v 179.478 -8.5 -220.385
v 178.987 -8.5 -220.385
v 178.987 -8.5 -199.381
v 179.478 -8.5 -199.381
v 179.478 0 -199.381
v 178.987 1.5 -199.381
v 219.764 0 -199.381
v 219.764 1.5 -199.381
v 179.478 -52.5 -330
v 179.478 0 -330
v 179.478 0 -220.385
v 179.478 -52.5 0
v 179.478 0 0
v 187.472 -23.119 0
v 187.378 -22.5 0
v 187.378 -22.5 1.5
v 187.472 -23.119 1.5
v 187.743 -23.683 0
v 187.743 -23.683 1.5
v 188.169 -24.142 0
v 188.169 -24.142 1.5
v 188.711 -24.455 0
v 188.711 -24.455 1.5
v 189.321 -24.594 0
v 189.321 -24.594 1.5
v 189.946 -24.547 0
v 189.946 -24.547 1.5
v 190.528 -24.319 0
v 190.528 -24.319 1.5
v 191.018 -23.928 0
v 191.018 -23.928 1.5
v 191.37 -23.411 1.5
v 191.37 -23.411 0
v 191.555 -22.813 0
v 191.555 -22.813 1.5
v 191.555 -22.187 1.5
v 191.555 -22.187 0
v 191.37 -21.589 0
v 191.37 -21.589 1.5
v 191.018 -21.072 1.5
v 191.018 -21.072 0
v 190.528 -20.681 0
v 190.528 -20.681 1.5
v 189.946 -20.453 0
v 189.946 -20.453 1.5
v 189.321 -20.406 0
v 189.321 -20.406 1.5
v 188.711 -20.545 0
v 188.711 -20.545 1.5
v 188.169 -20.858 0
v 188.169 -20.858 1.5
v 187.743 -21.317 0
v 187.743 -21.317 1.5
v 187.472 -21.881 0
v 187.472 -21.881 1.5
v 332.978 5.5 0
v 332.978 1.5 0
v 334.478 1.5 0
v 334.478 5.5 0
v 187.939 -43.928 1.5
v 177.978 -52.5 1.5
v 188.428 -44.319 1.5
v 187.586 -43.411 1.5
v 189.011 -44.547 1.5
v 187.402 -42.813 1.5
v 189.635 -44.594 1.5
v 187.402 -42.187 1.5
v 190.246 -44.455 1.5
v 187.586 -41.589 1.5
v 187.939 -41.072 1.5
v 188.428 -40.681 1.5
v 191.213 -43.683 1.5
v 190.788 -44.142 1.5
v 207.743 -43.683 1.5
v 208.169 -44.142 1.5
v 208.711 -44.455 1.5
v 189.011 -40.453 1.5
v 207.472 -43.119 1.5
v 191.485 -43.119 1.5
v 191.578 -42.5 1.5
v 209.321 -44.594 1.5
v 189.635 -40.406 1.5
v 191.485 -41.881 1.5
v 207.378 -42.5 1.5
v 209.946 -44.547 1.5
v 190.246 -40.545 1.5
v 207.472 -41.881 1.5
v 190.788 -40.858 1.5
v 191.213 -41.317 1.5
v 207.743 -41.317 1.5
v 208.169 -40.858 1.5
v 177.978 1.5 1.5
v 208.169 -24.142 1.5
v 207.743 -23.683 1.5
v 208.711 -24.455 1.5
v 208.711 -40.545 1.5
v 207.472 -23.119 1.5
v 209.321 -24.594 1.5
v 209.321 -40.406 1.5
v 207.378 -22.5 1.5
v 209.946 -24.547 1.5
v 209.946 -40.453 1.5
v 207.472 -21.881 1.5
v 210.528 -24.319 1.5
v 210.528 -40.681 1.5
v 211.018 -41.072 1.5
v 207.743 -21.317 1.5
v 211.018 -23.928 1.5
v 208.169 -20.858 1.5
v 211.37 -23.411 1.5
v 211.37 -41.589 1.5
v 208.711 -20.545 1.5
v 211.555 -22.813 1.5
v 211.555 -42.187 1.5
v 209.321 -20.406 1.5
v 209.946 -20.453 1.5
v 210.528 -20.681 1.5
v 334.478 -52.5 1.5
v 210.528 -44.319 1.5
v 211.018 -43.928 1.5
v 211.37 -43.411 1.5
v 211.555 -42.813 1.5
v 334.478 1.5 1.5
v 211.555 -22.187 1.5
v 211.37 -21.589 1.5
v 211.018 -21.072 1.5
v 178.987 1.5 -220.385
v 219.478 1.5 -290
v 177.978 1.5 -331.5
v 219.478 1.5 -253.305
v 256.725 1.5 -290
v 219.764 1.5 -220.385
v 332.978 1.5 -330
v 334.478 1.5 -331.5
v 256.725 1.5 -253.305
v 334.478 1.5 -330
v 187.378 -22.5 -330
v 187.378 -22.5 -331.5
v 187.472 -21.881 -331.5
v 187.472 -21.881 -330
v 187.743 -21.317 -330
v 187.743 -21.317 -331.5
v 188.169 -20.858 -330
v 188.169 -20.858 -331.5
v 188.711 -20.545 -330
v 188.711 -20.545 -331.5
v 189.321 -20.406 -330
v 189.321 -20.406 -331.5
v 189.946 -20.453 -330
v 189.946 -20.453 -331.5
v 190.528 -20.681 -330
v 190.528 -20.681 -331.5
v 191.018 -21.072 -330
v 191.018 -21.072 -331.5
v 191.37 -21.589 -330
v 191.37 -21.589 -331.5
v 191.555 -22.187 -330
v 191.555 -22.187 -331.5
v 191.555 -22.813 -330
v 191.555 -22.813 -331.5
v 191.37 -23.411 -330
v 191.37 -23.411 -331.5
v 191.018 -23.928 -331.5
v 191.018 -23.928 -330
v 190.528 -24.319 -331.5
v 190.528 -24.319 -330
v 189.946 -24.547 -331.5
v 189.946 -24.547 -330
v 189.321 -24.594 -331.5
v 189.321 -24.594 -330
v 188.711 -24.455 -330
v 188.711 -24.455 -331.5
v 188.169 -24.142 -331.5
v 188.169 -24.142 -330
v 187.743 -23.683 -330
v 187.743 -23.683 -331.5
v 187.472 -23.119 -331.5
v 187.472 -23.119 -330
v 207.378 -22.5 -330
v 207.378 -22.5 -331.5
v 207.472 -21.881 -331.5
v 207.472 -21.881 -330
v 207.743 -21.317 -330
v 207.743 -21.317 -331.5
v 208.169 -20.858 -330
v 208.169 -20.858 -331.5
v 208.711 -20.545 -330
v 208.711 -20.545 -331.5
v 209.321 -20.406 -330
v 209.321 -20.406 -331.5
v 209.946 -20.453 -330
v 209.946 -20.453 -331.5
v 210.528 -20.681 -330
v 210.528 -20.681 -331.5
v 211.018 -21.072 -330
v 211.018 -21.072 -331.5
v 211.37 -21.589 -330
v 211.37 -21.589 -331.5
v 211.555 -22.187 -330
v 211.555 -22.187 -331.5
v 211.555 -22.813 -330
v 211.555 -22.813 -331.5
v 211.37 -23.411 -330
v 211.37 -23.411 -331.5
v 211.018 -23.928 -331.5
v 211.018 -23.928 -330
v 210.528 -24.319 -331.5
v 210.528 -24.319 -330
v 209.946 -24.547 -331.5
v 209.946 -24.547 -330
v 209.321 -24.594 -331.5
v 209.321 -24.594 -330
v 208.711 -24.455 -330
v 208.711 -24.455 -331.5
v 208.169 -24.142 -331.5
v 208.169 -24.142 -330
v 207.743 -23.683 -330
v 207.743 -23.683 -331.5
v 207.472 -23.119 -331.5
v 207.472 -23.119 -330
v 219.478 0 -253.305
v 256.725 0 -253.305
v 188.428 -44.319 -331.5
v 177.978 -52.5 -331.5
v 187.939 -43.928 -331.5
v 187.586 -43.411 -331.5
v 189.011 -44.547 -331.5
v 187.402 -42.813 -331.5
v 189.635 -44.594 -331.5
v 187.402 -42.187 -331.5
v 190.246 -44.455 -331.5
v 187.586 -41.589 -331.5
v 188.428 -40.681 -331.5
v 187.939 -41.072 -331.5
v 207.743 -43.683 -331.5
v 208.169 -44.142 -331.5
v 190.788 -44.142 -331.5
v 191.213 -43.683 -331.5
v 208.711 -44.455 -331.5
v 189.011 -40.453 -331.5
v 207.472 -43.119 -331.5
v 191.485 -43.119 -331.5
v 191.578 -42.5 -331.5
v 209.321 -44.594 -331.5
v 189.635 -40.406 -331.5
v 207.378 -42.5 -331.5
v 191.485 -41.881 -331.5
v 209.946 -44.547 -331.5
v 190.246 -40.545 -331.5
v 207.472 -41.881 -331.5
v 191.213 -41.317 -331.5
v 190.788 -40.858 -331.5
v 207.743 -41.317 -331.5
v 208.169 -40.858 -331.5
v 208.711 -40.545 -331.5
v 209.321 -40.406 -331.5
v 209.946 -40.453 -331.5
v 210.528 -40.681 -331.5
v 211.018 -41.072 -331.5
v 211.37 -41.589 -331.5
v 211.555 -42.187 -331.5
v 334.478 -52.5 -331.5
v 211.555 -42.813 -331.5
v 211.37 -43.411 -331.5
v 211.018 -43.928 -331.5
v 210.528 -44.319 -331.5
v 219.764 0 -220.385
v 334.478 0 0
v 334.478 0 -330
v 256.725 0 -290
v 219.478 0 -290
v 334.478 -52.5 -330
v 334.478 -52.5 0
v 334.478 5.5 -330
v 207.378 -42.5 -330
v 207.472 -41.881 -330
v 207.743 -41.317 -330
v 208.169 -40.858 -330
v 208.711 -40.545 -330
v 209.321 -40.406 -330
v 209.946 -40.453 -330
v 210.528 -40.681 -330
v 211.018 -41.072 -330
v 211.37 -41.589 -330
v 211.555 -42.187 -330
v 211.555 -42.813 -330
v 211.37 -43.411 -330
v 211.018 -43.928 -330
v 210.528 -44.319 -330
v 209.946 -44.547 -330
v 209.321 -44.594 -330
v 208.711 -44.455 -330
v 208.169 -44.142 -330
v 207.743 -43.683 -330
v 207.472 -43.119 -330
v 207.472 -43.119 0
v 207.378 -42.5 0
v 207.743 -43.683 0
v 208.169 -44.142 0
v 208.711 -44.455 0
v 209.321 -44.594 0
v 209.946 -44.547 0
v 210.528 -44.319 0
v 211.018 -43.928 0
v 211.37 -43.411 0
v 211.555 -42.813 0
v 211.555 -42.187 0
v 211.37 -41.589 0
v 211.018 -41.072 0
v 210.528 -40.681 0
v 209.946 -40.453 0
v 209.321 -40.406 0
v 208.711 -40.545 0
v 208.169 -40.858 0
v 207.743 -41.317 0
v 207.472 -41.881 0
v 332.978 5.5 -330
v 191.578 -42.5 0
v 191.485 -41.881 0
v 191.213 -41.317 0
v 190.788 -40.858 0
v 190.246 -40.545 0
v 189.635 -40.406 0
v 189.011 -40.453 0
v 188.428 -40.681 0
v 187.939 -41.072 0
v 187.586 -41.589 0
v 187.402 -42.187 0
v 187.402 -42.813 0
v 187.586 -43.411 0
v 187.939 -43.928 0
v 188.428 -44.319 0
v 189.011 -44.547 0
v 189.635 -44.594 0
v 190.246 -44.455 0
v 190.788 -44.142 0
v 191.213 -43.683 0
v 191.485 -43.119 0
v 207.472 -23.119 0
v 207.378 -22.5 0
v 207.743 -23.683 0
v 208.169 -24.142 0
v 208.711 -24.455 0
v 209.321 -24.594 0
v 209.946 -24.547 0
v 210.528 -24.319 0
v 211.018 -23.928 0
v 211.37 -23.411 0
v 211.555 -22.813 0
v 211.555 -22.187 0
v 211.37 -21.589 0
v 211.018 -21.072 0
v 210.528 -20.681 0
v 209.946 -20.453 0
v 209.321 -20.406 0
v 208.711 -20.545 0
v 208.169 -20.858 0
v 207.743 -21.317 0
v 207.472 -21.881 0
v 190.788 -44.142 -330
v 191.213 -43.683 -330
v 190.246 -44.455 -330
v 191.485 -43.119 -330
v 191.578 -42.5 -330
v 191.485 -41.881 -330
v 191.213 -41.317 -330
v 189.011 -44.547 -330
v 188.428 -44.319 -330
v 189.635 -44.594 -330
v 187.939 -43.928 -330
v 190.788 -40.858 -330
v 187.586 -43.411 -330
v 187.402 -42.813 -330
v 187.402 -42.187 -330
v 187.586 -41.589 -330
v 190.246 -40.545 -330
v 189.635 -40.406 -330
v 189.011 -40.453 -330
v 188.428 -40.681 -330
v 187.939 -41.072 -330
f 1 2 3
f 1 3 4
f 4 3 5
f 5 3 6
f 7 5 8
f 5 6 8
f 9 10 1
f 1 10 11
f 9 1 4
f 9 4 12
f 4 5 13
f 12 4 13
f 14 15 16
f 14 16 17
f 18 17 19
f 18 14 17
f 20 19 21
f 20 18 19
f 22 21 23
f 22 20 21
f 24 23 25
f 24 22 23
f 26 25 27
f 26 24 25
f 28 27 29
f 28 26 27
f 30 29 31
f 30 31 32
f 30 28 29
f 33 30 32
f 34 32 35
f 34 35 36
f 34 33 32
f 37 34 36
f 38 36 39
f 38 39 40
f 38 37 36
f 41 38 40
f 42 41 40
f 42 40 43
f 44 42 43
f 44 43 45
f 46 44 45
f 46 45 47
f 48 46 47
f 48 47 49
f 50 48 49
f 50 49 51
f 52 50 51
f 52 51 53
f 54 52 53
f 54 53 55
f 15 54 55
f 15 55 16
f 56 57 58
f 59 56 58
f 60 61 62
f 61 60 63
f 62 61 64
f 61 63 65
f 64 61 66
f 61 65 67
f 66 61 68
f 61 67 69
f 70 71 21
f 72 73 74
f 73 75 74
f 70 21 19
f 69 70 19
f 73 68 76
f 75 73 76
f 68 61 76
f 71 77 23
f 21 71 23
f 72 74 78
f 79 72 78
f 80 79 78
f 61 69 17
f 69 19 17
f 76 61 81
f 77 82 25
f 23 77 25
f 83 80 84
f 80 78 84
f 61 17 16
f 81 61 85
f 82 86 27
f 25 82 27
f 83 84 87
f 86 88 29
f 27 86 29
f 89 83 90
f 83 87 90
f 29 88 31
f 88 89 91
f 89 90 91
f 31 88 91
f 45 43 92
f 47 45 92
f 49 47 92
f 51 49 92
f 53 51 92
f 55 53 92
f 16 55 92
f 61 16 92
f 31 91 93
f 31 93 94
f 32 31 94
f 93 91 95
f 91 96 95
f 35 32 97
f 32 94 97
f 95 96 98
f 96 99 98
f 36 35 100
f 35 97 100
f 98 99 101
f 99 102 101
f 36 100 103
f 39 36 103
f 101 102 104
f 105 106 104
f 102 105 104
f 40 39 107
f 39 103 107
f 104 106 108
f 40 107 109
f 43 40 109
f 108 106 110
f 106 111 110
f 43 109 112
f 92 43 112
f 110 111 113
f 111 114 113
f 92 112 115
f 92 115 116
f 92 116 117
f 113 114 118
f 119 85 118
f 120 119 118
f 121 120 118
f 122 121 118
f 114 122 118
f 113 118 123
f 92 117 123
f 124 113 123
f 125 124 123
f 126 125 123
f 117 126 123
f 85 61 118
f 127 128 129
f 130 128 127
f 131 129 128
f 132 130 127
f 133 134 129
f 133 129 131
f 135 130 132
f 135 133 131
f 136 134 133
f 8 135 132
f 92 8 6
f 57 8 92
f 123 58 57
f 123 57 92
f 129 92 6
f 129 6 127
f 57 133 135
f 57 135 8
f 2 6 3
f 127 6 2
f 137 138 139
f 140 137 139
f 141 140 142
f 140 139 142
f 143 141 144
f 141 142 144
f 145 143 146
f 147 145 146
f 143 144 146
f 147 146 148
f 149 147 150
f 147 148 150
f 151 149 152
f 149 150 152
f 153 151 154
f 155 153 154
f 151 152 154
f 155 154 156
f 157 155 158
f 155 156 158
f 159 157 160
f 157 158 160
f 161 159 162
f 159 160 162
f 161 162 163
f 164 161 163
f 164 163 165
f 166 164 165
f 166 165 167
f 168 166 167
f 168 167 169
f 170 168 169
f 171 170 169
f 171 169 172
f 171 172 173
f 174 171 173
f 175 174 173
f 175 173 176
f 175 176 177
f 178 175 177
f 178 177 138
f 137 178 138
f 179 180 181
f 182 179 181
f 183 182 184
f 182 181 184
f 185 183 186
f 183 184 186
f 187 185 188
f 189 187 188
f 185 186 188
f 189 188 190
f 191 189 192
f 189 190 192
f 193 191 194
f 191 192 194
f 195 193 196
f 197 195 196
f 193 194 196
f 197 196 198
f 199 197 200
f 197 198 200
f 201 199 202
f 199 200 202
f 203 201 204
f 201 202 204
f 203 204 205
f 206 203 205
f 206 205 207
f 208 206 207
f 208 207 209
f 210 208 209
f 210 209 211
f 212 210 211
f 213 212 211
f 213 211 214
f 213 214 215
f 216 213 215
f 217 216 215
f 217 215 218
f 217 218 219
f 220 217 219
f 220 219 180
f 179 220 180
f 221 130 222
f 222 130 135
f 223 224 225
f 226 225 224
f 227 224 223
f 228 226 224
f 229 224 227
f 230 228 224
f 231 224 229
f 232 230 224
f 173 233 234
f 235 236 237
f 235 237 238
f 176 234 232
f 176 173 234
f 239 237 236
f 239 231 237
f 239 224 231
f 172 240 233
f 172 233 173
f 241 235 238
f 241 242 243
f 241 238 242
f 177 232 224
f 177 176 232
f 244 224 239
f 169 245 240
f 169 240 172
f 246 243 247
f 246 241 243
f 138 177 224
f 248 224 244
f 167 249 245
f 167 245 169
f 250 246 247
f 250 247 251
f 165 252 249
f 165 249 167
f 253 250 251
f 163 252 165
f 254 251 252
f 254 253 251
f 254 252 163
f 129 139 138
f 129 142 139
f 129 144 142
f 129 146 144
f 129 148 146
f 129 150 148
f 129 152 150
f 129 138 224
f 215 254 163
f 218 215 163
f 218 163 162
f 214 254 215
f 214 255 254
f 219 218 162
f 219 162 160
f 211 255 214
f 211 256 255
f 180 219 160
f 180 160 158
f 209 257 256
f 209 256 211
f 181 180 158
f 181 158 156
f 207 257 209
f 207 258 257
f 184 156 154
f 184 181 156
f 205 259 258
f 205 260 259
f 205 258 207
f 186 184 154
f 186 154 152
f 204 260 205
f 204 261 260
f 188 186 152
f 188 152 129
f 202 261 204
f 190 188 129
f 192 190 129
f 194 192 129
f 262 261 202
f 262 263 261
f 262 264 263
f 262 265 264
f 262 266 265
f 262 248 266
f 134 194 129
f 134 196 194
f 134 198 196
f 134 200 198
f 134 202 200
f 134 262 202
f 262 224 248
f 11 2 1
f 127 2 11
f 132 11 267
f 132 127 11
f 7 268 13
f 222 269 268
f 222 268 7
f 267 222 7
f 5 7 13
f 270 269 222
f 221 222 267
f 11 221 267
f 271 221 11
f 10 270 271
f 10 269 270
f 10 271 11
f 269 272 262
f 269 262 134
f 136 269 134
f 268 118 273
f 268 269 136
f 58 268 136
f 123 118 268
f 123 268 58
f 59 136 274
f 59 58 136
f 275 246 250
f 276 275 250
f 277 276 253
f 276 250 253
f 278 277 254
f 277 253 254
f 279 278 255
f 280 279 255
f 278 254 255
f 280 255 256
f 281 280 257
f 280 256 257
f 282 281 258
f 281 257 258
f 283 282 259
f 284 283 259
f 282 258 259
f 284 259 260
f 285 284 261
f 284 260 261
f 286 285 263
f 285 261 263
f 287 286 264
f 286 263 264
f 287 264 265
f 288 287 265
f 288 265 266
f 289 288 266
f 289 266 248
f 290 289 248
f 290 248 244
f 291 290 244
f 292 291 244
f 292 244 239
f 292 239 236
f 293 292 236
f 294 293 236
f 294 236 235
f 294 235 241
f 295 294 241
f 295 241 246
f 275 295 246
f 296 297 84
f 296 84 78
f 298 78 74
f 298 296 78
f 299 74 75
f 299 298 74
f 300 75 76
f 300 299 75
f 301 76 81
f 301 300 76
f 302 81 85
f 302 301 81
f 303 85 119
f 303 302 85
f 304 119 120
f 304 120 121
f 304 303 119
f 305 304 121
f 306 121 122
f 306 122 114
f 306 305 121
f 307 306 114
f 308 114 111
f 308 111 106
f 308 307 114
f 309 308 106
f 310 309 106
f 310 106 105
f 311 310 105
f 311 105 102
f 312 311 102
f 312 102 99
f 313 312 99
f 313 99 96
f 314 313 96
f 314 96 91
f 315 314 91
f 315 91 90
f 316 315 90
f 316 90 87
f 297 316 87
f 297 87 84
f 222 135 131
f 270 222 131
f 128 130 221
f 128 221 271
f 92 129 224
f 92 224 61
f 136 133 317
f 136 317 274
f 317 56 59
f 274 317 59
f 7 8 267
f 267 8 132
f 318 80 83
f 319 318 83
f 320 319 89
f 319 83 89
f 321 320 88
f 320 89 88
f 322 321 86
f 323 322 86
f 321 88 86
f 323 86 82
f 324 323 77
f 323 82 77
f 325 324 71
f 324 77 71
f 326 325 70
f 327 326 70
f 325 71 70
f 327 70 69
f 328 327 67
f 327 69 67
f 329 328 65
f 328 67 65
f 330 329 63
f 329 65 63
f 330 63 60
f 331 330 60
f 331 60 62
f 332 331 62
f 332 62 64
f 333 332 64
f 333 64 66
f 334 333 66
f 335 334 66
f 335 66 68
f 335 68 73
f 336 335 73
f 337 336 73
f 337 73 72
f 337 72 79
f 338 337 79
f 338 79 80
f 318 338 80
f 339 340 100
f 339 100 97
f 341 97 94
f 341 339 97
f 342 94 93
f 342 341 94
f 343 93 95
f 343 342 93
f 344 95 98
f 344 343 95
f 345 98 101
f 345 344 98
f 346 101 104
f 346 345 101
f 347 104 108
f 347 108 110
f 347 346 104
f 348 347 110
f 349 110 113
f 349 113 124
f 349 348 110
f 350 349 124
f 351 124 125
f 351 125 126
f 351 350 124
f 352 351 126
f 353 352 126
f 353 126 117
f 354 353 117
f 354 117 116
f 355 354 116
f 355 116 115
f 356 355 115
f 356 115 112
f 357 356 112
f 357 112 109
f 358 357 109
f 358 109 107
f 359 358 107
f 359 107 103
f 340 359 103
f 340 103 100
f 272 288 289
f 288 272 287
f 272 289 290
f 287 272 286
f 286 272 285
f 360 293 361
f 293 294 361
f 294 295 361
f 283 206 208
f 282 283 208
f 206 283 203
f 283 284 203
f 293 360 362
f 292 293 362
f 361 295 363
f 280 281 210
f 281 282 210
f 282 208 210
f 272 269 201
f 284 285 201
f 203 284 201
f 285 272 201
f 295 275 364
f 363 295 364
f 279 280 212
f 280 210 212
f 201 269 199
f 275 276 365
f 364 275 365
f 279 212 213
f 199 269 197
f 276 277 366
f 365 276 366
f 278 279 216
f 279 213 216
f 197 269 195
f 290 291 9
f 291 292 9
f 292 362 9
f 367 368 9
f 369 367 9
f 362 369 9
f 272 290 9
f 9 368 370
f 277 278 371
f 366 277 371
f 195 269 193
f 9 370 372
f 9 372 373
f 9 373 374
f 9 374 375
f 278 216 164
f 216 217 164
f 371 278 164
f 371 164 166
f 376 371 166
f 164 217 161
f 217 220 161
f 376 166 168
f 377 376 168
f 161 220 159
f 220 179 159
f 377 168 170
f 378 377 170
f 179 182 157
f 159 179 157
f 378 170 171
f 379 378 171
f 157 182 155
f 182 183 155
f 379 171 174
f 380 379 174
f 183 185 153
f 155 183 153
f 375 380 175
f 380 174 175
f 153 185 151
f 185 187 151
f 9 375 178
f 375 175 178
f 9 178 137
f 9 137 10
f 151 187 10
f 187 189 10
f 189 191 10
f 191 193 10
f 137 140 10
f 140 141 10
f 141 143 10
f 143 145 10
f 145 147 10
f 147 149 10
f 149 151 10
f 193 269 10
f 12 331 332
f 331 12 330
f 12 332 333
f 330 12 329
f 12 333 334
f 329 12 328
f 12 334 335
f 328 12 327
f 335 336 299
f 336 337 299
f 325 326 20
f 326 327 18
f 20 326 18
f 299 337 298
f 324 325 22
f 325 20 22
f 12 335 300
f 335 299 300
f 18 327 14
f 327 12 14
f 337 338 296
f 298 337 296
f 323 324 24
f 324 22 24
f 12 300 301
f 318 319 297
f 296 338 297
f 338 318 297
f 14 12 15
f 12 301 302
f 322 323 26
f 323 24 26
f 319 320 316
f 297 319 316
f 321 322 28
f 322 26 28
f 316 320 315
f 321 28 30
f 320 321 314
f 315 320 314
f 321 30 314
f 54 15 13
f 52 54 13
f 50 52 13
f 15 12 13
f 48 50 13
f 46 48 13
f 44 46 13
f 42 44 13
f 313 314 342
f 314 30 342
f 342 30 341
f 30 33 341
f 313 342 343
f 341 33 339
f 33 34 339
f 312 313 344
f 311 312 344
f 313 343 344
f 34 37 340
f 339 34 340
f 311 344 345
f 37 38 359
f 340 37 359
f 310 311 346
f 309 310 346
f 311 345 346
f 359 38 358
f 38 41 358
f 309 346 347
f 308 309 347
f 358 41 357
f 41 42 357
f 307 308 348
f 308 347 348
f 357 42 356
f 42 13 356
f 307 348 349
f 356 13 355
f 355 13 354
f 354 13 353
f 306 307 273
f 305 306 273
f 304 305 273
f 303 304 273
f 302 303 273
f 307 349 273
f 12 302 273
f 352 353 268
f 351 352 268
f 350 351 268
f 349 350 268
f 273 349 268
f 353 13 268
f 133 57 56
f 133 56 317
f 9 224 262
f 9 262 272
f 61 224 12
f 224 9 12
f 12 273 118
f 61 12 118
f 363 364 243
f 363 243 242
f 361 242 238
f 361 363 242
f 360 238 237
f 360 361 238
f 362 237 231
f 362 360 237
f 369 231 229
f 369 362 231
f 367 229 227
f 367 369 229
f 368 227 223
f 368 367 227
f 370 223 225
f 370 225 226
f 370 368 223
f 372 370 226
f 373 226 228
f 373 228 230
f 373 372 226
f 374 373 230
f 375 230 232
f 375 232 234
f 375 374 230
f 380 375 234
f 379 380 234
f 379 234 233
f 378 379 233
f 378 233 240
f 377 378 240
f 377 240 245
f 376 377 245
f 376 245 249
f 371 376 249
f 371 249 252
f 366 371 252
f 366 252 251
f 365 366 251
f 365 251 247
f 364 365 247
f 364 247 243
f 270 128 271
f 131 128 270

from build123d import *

# Parameters (mm, degrees)
BOSS_EXTRUDE4_DEPTH  = 1.5
SKETCH5_W            = 155
SKETCH5_H            = 54
BOSS_EXTRUDE5_DEPTH  = 1.5
SKETCH8_W            = 1.5
SKETCH8_H            = 330
BOSS_EXTRUDE14_DEPTH = 4
SKETCH7_W            = 155
SKETCH7_H            = 54
BOSS_EXTRUDE18_DEPTH = 1.5
SKETCH9_W            = 333
SKETCH9_H            = 54
BOSS_EXTRUDE19_DEPTH = 1.5
SKETCH10_R           = 2.1
CUT_EXTRUDE1_DEPTH   = 10
CUT_EXTRUDE2_START   = -10
SKETCH17_R           = 2.1
CUT_EXTRUDE2_DEPTH   = 10
SKETCH16_R           = 2.1
CUT_EXTRUDE3_DEPTH   = 10
CUT_EXTRUDE4_START   = -10
SKETCH11_R           = 2.1
CUT_EXTRUDE4_DEPTH   = 10
SKETCH12_R           = 2.1
CUT_EXTRUDE5_DEPTH   = 10
SKETCH13_R           = 2.1
CUT_EXTRUDE6_DEPTH   = 10
CUT_EXTRUDE7_START   = -10
SKETCH14_R           = 2.1
CUT_EXTRUDE7_DEPTH   = 10
CUT_EXTRUDE8_START   = -10
SKETCH15_R           = 2.1
CUT_EXTRUDE8_DEPTH   = 10
SKETCH18_W           = 40.776716255
SKETCH18_H           = 21.003646254
CUT_EXTRUDE9_DEPTH   = 10
SKETCH21_W           = 37.24685685
SKETCH21_H           = 36.694897388
CUT_EXTRUDE12_DEPTH  = 10


with BuildPart() as part:
    # Sketch4 → Boss-Extrude4 (new body)
    with BuildSketch(Plane(origin=(0, 0, 0), x_dir=(1, 0, 0), z_dir=(0, 1, 0))):
        Polygon((179.47837592, 330), (334.47837592, 330), (334.47837592, 0), (179.47837592, 0), (179.47837592, 200), (179.47837592, 265), align=None)
    extrude(amount=BOSS_EXTRUDE4_DEPTH)

    # Sketch5 → Boss-Extrude5 (add)
    with BuildSketch(Plane.XY):
        with Locations((256.97837592, -25.5)):
            Rectangle(SKETCH5_W, SKETCH5_H)
    extrude(amount=BOSS_EXTRUDE5_DEPTH)

    # Sketch8 → Boss-Extrude14 (add)
    with BuildSketch(Plane(origin=(0, 1.5, 0), x_dir=(1, 0, 0), z_dir=(0, 1, 0))):
        with Locations((333.72837592, 165)):
            Rectangle(SKETCH8_W, SKETCH8_H)
    extrude(amount=BOSS_EXTRUDE14_DEPTH)

    # Sketch7 → Boss-Extrude18 (add)
    with BuildSketch(Plane(origin=(0, 0, -330), x_dir=(-1, 0, 0), z_dir=(0, 0, -1))):
        with Locations((-256.97837592, -25.5)):
            Rectangle(SKETCH7_W, SKETCH7_H)
    extrude(amount=BOSS_EXTRUDE18_DEPTH)

    # Sketch9 → Boss-Extrude19 (add)
    with BuildSketch(Plane.ZY.offset(-179.47837592)):
        with Locations((-165, -25.5)):
            Rectangle(SKETCH9_W, SKETCH9_H)
    extrude(amount=BOSS_EXTRUDE19_DEPTH)

    # Sketch10 → Cut-Extrude1 (cut)
    with BuildSketch(Plane(origin=(0, 0, -331.5), x_dir=(-1, 0, 0), z_dir=(0, 0, -1))):
        with Locations((-209.47837592, -42.5)):
            Circle(SKETCH10_R)
    extrude(amount=-CUT_EXTRUDE1_DEPTH, mode=Mode.SUBTRACT)

    # Sketch17 → Cut-Extrude2 (cut)
    with BuildSketch(Plane.XY.offset(1.5).offset(CUT_EXTRUDE2_START)):
        with Locations(Location((209.47837592, -42.5, 0), (0, 0, 180))):
            Circle(SKETCH17_R)
    extrude(amount=CUT_EXTRUDE2_DEPTH, mode=Mode.SUBTRACT)

    # Sketch16 → Cut-Extrude3 (cut)
    with BuildSketch(Plane.XY.offset(1.5)):
        with Locations((189.47837592, -42.5)):
            Circle(SKETCH16_R)
    extrude(amount=-CUT_EXTRUDE3_DEPTH, mode=Mode.SUBTRACT)

    # Sketch11 → Cut-Extrude4 (cut)
    with BuildSketch(Plane(origin=(0, 0, -331.5), x_dir=(-1, 0, 0), z_dir=(0, 0, -1)).offset(CUT_EXTRUDE4_START)):
        with Locations(Location((-189.47837592, -42.5, 0), (0, 0, 180))):
            Circle(SKETCH11_R)
    extrude(amount=CUT_EXTRUDE4_DEPTH, mode=Mode.SUBTRACT)

    # Sketch12 → Cut-Extrude5 (cut)
    with BuildSketch(Plane(origin=(0, 0, -331.5), x_dir=(-1, 0, 0), z_dir=(0, 0, -1))):
        with Locations((-189.47837592, -22.5)):
            Circle(SKETCH12_R)
    extrude(amount=-CUT_EXTRUDE5_DEPTH, mode=Mode.SUBTRACT)

    # Sketch13 → Cut-Extrude6 (cut)
    with BuildSketch(Plane(origin=(0, 0, -331.5), x_dir=(-1, 0, 0), z_dir=(0, 0, -1))):
        with Locations((-209.47837592, -22.5)):
            Circle(SKETCH13_R)
    extrude(amount=-CUT_EXTRUDE6_DEPTH, mode=Mode.SUBTRACT)

    # Sketch14 → Cut-Extrude7 (cut)
    with BuildSketch(Plane.XY.offset(1.5).offset(CUT_EXTRUDE7_START)):
        with Locations(Location((189.47837592, -22.5, 0), (0, 0, 180))):
            Circle(SKETCH14_R)
    extrude(amount=CUT_EXTRUDE7_DEPTH, mode=Mode.SUBTRACT)

    # Sketch15 → Cut-Extrude8 (cut)
    with BuildSketch(Plane.XY.offset(1.5).offset(CUT_EXTRUDE8_START)):
        with Locations(Location((209.47837592, -22.5, 0), (0, 0, 180))):
            Circle(SKETCH15_R)
    extrude(amount=CUT_EXTRUDE8_DEPTH, mode=Mode.SUBTRACT)

    # Sketch18 → Cut-Extrude9 (cut)
    with BuildSketch(Plane(origin=(0, 1.5, 0), x_dir=(1, 0, 0), z_dir=(0, 1, 0))):
        with Locations((199.375823154, 209.882956498)):
            Rectangle(SKETCH18_W, SKETCH18_H)
    extrude(amount=-CUT_EXTRUDE9_DEPTH, mode=Mode.SUBTRACT)

    # Sketch21 → Cut-Extrude12 (cut)
    with BuildSketch(Plane(origin=(0, 1.5, 0), x_dir=(1, 0, 0), z_dir=(0, 1, 0))):
        with Locations((238.101804345, 271.652551306)):
            Rectangle(SKETCH21_W, SKETCH21_H)
    extrude(amount=-CUT_EXTRUDE12_DEPTH, mode=Mode.SUBTRACT)


solid = part.part
